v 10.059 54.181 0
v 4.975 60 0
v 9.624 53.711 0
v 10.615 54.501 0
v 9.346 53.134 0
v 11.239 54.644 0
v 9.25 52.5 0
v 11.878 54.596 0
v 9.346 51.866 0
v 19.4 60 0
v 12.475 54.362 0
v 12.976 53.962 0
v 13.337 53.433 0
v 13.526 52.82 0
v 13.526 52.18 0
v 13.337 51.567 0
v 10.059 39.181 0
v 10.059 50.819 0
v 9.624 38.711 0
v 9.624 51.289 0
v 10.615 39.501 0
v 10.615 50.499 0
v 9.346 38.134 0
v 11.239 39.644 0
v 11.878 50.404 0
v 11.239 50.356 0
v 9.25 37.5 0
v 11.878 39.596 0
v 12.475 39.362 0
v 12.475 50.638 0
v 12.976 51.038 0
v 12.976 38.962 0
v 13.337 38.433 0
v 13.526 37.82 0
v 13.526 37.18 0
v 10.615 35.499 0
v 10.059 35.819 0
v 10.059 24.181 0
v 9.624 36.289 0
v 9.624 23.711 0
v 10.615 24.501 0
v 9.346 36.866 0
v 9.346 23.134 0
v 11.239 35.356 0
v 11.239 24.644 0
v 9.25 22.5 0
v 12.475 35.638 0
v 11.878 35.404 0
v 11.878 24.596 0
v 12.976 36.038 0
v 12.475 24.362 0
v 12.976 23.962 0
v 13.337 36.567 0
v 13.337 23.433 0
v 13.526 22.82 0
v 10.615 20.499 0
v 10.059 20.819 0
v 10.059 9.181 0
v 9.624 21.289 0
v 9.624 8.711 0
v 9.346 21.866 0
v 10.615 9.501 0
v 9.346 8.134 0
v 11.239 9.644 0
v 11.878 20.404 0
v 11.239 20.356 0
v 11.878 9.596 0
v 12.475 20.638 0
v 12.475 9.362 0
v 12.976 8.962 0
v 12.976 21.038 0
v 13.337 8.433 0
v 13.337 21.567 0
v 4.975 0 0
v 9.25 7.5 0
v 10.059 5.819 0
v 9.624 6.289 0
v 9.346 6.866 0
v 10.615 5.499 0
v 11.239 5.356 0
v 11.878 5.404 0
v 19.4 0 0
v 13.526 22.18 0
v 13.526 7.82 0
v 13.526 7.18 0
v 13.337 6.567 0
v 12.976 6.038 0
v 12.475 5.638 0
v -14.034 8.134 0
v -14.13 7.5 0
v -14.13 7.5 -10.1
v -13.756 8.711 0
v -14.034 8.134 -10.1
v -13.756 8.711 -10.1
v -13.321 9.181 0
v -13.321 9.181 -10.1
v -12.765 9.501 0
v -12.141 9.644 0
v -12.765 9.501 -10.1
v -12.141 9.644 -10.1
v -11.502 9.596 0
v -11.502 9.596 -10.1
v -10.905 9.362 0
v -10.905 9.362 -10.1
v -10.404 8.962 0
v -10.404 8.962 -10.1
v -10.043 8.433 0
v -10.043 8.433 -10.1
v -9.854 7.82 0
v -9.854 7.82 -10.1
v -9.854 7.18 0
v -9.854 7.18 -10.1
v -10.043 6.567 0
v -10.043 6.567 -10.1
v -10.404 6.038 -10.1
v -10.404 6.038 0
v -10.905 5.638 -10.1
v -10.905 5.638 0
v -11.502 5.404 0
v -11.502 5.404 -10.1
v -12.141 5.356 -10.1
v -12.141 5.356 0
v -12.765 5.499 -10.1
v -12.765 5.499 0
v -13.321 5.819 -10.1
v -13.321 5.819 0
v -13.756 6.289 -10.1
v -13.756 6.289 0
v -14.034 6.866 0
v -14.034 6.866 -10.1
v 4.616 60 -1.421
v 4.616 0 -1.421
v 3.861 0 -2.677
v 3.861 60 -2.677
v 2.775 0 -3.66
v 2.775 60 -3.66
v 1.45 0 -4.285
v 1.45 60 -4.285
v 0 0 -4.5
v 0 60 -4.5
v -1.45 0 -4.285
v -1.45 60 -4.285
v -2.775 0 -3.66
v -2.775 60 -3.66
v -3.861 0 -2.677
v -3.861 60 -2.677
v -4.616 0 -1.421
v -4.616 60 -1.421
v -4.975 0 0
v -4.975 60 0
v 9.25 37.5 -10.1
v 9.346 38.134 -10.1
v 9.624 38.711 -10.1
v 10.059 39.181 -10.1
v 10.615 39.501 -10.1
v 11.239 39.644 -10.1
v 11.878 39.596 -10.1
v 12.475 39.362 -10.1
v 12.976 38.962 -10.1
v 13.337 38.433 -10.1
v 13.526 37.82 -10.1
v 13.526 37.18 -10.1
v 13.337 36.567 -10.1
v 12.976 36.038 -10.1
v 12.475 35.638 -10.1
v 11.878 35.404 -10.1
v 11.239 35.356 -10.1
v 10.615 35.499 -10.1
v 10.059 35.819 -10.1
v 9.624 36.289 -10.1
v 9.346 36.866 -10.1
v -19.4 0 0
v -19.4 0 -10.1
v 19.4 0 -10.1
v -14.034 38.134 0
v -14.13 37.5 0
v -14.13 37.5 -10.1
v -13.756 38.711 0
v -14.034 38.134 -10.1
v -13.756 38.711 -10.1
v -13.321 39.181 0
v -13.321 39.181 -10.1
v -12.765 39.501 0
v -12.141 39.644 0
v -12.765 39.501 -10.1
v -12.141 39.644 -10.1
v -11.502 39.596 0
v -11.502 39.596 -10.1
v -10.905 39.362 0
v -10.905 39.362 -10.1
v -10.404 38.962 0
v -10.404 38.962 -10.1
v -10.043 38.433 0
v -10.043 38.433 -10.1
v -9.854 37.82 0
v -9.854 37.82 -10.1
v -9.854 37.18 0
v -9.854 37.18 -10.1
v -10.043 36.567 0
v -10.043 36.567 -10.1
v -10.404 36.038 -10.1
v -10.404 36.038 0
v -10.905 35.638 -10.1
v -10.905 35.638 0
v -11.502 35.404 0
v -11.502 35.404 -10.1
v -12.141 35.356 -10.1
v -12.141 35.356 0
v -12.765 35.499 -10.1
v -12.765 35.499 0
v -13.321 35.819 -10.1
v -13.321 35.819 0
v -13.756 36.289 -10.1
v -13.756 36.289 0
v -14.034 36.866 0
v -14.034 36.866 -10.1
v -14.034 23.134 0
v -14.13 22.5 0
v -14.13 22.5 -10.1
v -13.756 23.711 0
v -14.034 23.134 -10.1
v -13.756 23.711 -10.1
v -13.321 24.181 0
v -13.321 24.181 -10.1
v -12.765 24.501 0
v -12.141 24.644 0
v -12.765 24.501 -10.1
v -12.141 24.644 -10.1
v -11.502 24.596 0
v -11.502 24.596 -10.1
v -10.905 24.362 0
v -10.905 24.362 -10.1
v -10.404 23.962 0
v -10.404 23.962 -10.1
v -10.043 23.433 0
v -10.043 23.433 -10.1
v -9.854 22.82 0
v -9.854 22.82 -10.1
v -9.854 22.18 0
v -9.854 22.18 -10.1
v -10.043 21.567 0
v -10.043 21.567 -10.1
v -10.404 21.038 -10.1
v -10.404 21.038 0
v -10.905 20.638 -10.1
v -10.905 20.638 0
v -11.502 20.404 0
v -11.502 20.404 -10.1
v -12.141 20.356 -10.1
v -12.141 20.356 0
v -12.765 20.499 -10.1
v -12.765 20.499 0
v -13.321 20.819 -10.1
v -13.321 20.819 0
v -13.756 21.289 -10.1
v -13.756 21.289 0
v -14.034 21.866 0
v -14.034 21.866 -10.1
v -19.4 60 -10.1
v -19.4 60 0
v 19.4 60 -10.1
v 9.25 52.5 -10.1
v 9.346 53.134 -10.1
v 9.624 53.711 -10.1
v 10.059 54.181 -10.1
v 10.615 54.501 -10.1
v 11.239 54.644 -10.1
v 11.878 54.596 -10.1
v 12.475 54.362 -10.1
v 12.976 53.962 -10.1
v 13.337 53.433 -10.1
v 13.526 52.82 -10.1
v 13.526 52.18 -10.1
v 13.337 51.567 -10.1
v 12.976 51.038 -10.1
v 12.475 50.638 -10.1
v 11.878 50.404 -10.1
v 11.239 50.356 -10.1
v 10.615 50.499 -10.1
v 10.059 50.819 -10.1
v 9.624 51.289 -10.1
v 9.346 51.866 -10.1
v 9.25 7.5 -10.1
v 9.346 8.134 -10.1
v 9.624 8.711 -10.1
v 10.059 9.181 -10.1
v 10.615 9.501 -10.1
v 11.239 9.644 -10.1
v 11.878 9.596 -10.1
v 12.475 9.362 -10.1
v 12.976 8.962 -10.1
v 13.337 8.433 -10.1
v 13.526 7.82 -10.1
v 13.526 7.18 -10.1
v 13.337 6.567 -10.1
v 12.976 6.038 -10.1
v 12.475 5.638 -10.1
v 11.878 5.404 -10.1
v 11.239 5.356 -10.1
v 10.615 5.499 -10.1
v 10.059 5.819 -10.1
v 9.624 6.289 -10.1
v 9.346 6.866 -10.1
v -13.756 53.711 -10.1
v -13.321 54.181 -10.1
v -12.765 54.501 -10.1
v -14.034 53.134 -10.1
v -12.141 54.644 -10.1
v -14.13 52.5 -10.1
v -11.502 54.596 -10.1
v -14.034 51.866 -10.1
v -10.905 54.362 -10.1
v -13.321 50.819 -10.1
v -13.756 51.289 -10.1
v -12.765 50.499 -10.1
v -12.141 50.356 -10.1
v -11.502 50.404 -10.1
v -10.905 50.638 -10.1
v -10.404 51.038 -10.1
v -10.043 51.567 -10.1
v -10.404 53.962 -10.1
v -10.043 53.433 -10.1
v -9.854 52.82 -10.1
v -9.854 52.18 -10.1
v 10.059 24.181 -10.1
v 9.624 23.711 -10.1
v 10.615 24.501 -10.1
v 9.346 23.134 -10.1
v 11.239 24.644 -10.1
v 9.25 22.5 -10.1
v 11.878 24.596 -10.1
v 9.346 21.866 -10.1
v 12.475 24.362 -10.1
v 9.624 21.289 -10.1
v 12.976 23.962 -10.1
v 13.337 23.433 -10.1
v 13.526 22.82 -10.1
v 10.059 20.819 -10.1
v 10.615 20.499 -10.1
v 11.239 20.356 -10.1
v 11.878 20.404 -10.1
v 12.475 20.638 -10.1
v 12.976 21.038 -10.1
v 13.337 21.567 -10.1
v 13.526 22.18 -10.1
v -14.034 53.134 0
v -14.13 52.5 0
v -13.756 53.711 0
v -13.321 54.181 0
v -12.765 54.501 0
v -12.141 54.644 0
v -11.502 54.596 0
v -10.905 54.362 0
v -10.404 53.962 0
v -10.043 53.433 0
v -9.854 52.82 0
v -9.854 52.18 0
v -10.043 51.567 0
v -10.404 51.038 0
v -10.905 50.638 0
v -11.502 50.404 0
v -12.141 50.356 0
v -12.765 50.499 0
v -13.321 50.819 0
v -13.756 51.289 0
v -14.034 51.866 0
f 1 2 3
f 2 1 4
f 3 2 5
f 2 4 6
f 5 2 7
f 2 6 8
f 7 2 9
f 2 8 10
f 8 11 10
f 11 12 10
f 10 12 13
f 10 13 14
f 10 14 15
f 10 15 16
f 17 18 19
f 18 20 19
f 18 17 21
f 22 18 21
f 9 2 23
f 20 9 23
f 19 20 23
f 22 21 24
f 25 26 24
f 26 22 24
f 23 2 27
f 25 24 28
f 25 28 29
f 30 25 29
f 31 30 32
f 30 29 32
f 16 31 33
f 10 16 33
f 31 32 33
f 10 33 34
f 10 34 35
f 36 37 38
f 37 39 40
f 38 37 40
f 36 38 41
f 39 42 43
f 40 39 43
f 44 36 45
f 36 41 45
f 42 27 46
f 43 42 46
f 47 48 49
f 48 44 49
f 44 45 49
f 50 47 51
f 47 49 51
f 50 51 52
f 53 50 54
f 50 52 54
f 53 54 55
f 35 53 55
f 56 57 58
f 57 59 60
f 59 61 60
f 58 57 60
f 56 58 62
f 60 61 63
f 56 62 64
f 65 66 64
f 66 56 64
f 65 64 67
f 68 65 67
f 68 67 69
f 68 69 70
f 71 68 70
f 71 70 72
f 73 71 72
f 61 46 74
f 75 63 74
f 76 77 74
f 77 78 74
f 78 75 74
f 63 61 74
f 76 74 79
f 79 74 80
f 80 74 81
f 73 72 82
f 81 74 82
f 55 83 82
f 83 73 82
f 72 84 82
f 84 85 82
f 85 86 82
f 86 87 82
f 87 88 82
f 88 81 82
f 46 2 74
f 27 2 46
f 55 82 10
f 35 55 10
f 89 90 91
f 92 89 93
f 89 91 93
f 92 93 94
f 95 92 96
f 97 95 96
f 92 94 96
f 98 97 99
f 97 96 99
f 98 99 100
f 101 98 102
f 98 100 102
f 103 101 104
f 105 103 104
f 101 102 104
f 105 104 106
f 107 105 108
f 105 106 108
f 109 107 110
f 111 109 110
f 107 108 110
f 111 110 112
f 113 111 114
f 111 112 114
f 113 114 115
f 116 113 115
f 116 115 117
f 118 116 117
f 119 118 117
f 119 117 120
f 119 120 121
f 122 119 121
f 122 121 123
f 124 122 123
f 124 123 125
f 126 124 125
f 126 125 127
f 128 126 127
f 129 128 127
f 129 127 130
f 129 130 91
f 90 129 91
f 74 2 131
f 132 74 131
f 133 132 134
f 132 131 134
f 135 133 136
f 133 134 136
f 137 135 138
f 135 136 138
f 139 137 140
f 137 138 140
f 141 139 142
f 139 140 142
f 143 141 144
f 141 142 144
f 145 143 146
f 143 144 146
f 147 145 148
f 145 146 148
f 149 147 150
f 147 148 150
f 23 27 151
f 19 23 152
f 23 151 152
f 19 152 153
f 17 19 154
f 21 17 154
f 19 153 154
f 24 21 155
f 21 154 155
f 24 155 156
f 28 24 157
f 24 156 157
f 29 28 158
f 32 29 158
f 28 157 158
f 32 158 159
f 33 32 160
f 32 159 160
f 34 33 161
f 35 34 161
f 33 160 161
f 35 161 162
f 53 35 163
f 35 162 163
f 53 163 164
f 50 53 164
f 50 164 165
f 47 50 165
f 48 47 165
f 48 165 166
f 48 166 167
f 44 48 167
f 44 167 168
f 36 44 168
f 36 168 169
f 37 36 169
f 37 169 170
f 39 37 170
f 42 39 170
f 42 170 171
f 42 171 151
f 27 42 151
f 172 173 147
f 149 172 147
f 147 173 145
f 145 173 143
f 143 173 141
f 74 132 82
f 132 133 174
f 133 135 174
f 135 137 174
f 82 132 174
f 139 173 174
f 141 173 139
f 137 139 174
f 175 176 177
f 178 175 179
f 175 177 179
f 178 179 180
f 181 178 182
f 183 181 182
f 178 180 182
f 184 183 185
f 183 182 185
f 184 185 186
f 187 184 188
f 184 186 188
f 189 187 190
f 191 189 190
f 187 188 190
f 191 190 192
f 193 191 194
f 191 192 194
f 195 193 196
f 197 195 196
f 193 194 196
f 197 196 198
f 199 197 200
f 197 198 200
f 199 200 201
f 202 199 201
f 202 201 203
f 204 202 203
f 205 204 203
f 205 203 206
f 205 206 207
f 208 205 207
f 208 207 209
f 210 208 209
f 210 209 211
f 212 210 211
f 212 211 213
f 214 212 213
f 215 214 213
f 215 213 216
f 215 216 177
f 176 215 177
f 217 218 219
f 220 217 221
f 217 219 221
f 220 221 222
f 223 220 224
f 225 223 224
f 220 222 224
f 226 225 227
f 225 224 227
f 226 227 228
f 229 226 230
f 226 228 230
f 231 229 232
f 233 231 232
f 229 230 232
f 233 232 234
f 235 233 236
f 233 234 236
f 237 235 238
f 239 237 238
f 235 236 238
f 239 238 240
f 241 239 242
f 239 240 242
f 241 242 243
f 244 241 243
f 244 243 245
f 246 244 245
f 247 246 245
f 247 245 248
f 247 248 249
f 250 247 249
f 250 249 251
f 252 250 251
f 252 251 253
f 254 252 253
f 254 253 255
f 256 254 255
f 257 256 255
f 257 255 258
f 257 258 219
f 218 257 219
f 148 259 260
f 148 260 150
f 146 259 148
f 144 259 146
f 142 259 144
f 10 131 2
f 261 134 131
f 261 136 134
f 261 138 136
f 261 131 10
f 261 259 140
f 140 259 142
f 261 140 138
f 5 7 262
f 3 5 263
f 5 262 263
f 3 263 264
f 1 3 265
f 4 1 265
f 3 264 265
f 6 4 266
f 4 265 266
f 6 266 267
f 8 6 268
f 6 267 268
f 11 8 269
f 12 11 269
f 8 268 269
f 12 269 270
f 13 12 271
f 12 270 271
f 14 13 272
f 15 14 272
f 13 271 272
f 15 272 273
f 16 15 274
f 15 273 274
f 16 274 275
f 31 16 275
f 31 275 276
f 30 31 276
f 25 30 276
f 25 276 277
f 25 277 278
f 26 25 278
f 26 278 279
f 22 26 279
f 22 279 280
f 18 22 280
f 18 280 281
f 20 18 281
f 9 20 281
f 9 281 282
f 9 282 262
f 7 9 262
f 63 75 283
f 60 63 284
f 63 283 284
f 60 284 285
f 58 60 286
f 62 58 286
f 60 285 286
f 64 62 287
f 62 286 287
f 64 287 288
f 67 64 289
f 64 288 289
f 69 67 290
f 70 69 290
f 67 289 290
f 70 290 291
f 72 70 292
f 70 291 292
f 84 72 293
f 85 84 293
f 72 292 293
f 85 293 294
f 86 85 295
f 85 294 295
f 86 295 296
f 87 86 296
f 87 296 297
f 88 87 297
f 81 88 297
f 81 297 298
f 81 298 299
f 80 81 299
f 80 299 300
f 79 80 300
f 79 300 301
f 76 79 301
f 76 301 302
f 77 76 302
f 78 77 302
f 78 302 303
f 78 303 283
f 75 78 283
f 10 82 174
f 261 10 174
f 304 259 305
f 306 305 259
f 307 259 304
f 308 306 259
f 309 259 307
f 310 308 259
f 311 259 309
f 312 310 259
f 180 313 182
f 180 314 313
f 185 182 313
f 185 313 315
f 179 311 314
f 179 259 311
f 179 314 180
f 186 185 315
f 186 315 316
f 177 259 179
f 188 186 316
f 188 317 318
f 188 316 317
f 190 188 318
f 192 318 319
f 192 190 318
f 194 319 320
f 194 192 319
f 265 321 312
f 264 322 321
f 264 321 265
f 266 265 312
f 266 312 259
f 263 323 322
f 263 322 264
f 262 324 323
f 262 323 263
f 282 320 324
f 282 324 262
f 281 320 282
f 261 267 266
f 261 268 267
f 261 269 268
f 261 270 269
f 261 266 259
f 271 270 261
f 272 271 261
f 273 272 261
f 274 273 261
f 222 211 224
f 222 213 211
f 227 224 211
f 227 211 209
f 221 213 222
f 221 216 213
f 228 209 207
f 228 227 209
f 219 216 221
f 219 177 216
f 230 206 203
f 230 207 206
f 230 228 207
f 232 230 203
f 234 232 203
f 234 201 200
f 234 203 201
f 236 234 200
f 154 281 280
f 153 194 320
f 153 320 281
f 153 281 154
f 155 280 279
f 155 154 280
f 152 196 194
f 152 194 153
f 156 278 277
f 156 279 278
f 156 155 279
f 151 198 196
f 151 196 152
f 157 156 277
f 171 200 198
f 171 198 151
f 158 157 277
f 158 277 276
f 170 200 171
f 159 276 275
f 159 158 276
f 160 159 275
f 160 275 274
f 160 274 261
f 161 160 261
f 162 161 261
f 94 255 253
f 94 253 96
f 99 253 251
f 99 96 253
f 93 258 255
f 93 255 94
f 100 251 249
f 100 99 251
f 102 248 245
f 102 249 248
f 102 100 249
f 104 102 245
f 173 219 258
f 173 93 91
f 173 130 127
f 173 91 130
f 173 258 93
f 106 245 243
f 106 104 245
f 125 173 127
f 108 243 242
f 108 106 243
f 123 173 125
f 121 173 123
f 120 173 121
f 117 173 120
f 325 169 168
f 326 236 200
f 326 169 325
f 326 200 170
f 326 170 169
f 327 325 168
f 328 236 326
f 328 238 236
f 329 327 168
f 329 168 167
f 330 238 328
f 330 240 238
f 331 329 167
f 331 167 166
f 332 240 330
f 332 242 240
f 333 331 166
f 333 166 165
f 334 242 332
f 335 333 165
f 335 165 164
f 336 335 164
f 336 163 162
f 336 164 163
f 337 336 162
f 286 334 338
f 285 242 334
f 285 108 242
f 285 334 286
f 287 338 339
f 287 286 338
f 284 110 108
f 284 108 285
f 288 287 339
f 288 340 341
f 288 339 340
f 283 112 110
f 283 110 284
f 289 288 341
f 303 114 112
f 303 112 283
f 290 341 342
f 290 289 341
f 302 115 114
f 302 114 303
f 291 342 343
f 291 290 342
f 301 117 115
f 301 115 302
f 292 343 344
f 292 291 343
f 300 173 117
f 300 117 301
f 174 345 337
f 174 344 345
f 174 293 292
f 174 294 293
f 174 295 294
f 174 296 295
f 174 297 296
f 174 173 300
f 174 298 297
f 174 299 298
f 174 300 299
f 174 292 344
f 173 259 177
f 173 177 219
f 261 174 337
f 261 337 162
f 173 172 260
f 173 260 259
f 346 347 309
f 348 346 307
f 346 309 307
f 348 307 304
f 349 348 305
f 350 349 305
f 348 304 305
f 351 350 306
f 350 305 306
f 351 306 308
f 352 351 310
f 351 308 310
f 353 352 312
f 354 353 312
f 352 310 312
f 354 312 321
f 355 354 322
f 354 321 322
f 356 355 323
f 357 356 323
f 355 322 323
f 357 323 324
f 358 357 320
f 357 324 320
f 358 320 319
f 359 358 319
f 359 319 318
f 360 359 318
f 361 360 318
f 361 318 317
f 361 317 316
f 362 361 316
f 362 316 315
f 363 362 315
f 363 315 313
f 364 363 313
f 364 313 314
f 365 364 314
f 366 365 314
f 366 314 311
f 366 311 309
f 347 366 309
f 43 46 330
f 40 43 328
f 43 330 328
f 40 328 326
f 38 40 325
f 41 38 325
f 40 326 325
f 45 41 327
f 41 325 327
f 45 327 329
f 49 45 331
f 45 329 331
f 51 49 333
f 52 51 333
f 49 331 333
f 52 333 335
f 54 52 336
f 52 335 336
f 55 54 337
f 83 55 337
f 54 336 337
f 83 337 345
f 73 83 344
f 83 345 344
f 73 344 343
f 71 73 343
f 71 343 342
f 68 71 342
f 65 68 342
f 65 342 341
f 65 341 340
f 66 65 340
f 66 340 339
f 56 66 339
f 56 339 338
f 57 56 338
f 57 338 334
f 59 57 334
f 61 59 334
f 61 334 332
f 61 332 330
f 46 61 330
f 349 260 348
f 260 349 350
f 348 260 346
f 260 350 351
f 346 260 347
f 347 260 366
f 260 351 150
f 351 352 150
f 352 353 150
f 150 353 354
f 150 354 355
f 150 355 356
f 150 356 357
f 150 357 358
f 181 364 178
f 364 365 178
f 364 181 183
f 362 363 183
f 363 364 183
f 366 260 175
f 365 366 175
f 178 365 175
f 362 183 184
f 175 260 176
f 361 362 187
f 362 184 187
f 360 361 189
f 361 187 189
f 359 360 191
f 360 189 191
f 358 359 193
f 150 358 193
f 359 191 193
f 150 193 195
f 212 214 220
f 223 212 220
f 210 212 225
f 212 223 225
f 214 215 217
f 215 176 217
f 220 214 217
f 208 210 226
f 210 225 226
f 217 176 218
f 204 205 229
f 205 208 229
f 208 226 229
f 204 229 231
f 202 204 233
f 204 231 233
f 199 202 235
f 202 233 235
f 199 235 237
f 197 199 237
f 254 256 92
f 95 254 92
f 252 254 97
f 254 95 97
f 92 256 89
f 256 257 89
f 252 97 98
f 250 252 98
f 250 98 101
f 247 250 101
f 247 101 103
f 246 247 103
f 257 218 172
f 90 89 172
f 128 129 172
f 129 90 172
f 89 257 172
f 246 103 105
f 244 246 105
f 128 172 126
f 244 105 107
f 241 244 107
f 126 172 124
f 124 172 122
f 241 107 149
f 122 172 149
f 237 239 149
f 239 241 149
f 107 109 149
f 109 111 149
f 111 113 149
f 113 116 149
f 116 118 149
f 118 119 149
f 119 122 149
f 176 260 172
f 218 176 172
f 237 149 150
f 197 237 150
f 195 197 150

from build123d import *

# Parameters (mm, degrees)
SKETCH_1_W          = 38.8
SKETCH_1_H          = 10.1
EXTRUDE_1_DEPTH     = 60
SKETCH_2_R          = 5
CUT_EXTRUDE_1_DEPTH = 60
SKETCH_3_R          = 2.15
CUT_EXTRUDE_2_DEPTH = 64.862117096


with BuildPart() as part:
    # 草图1 → 凸台-拉伸1 (new body)
    with BuildSketch(Plane(origin=(0, 0, 0), x_dir=(1, 0, 0), z_dir=(0, 1, 0))):
        with Locations((0, 5.05)):
            Rectangle(SKETCH_1_W, SKETCH_1_H)
    extrude(amount=EXTRUDE_1_DEPTH)

    # 草图2 → 切除-拉伸1 (cut)
    with BuildSketch(Plane(origin=(0, 60, 0), x_dir=(1, 0, 0), z_dir=(0, 1, 0))):
        with Locations((0, -0.5)):
            Circle(SKETCH_2_R)
    extrude(amount=-CUT_EXTRUDE_1_DEPTH, mode=Mode.SUBTRACT)

    # 草图3 → 切除-拉伸2 (cut, through all)
    with BuildSketch(Plane(origin=(0, 0, -10.1), x_dir=(-1, 0, 0), z_dir=(0, 0, -1))):
        with Locations((-11.4, 52.5)):
            Circle(SKETCH_3_R)
        with Locations((-11.4, 37.5)):
            Circle(SKETCH_3_R)
        with Locations((-11.4, 22.5)):
            Circle(SKETCH_3_R)
        with Locations((-11.4, 7.5)):
            Circle(SKETCH_3_R)
        with Locations((11.98, 52.5)):
            Circle(SKETCH_3_R)
        with Locations((11.98, 37.5)):
            Circle(SKETCH_3_R)
        with Locations((11.98, 22.5)):
            Circle(SKETCH_3_R)
        with Locations((11.98, 7.5)):
            Circle(SKETCH_3_R)
    extrude(amount=-CUT_EXTRUDE_2_DEPTH, mode=Mode.SUBTRACT)


solid = part.part
